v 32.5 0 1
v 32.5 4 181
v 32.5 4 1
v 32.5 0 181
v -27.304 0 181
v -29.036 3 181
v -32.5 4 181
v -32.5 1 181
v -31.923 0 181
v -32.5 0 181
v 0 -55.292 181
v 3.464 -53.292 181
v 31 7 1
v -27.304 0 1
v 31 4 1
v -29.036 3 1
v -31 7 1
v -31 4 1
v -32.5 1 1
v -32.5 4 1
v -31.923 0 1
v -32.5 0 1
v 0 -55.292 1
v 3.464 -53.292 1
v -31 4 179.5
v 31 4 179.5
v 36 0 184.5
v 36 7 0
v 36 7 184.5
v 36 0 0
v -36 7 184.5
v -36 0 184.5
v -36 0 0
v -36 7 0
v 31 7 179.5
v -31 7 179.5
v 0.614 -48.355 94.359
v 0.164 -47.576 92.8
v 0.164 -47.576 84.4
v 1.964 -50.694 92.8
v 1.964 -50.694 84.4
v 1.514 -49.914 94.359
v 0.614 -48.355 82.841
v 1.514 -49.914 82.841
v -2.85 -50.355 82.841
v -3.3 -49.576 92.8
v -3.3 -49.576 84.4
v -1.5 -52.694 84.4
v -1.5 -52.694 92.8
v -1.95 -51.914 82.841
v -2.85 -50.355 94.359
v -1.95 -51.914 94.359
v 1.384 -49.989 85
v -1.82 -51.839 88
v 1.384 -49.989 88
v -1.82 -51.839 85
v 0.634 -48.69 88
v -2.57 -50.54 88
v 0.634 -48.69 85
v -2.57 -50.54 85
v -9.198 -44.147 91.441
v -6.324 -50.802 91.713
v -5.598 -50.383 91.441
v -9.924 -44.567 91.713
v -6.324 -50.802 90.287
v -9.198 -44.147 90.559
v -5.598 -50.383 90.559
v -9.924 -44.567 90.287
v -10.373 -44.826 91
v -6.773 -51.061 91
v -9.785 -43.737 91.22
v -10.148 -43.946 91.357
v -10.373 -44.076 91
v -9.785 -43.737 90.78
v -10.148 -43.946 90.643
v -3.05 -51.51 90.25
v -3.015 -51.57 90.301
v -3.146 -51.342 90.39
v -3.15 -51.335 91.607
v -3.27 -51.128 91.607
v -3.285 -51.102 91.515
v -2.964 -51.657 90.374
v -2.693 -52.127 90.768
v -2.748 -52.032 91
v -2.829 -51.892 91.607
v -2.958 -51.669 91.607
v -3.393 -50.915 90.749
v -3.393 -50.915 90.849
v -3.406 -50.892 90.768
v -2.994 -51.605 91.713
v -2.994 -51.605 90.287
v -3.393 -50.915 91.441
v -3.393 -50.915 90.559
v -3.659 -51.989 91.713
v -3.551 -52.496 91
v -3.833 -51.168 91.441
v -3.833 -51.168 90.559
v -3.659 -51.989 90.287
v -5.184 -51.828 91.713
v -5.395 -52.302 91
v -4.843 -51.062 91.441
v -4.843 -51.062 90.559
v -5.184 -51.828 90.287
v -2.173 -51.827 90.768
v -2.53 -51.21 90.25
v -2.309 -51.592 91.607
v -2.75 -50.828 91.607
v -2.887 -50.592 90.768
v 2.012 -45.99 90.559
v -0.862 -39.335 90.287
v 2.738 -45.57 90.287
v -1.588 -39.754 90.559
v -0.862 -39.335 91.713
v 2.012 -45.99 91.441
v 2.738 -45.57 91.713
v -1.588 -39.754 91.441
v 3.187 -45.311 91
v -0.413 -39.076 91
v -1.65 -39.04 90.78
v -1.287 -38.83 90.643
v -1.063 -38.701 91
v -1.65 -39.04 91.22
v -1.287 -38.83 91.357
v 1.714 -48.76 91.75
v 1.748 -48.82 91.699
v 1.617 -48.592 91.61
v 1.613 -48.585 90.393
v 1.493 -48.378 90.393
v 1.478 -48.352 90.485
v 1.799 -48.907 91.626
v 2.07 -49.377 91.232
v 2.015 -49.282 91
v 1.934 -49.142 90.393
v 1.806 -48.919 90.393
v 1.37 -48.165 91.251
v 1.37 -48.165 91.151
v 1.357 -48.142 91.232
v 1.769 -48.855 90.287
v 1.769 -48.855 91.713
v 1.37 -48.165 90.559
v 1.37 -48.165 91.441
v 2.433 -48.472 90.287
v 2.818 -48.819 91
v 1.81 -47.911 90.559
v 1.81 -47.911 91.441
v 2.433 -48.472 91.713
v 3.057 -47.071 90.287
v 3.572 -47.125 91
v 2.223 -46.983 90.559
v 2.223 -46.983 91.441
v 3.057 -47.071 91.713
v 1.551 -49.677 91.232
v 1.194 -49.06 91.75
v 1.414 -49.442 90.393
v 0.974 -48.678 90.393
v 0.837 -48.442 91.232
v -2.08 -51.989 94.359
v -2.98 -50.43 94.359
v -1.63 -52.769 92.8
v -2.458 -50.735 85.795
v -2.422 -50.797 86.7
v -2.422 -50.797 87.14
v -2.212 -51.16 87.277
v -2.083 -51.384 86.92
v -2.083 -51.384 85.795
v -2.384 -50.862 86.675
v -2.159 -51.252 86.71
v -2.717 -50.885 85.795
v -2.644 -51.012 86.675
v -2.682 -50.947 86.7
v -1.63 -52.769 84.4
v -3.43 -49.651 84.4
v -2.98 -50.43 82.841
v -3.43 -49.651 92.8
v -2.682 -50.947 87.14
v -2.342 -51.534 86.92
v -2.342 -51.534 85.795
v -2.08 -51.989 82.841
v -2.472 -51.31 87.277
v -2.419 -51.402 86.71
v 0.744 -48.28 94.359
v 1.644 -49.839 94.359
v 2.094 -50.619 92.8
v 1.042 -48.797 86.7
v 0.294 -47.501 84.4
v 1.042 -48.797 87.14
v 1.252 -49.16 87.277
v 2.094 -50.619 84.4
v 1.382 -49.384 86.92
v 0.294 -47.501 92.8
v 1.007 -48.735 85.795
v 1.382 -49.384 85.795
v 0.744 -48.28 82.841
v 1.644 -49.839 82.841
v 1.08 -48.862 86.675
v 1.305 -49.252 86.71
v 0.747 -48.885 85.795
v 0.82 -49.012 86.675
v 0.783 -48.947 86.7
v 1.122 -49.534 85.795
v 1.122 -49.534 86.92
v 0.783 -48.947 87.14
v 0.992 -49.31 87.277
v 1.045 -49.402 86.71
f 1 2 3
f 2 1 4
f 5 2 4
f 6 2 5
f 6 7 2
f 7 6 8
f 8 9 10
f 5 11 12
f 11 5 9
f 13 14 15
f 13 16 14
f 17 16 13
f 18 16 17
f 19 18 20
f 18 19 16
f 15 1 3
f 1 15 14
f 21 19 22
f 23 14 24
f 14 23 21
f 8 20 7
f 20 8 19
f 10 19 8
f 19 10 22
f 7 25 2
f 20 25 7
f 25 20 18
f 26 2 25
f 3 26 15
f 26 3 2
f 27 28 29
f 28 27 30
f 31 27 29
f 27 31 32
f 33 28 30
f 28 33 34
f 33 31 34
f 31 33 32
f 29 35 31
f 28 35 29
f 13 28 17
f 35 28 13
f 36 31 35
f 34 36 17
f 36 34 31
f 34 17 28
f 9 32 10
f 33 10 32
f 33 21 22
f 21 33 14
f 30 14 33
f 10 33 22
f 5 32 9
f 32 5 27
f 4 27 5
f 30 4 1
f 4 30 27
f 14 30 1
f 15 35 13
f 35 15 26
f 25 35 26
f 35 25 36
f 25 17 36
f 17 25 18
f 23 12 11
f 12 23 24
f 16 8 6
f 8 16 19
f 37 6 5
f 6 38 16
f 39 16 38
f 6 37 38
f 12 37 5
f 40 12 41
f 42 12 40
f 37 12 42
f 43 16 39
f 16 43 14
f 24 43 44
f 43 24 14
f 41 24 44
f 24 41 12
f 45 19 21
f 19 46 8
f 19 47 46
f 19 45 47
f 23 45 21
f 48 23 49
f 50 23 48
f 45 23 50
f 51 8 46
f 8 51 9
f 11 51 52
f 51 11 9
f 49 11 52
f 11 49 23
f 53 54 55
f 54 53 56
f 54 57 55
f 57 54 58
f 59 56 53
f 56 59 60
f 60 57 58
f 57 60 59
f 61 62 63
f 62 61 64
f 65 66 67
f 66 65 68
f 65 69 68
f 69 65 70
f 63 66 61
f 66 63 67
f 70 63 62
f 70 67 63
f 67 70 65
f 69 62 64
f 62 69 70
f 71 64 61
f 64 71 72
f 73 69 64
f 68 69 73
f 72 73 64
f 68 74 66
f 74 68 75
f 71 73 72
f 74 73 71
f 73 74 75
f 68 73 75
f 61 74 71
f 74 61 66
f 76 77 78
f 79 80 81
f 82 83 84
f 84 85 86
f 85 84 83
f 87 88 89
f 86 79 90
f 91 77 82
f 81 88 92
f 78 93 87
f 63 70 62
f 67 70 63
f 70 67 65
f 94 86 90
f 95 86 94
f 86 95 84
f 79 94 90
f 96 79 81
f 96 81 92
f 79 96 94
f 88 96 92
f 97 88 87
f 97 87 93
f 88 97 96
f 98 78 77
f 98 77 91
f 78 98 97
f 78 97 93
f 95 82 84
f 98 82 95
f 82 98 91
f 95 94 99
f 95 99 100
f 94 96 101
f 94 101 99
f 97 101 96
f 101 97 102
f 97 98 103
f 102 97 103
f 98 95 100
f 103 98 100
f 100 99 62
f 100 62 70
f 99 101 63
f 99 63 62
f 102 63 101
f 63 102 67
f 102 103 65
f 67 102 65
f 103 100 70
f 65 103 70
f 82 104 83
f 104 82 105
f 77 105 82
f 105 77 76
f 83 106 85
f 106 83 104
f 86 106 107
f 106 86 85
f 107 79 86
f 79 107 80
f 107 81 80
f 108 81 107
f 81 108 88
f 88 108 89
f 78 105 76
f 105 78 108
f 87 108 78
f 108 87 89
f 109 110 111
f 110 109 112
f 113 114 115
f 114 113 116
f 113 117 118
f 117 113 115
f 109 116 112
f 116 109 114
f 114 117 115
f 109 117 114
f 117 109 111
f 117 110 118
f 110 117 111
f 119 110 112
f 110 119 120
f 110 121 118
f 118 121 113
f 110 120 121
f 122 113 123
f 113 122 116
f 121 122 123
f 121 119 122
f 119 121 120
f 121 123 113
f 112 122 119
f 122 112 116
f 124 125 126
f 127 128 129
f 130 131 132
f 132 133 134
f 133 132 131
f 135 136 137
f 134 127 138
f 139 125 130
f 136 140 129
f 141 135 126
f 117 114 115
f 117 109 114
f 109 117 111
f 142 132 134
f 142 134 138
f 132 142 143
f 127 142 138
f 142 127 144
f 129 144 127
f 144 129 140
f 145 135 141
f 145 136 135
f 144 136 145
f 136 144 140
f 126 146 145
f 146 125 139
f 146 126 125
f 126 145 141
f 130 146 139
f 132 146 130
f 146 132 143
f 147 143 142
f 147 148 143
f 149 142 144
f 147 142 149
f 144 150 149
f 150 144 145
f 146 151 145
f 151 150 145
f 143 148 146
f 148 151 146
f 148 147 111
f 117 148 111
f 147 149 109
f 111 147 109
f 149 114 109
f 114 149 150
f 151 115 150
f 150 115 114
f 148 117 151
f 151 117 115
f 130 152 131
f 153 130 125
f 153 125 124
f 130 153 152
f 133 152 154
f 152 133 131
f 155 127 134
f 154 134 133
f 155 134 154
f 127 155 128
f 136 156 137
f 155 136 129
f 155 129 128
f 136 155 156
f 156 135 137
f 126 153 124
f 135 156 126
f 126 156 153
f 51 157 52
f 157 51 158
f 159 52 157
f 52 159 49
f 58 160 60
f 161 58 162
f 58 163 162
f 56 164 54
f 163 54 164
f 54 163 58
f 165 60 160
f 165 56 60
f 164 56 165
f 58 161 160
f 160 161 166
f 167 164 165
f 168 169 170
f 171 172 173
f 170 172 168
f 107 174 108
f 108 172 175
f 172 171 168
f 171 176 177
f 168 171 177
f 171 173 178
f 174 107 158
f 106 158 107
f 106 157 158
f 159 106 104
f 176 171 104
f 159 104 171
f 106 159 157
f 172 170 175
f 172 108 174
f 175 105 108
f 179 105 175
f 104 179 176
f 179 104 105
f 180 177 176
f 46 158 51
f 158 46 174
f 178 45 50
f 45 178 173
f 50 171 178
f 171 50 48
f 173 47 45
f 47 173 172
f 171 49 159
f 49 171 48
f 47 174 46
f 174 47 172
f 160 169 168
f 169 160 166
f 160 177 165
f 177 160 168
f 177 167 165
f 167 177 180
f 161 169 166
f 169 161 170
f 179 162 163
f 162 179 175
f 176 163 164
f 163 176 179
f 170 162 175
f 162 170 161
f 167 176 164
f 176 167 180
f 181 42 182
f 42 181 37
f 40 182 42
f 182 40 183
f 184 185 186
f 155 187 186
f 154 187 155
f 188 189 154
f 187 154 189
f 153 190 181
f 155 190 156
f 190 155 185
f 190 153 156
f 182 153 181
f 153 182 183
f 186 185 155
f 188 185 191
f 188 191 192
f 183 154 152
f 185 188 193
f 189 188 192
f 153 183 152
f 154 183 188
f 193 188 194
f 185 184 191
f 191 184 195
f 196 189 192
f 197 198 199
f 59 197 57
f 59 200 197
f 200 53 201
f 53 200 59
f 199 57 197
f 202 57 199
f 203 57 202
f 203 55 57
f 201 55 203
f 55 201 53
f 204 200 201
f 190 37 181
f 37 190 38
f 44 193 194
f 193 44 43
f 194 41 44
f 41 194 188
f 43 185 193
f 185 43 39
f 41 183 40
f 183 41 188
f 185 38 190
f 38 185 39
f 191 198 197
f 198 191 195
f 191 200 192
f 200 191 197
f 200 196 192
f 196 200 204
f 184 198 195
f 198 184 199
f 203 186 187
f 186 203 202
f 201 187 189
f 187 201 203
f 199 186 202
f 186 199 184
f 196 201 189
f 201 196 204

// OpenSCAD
// file: ../../shared/doorhandle.scad
size=100;
door_thickness=40;


module doorhandle(s=size, dt=door_thickness){
    
    pl=s;//plate_length
    pw=0.3*s;//plate_width
    pt=s/40;//plate_thickness 
    kr=s/32; //keyhole_radius
    hr=s/16; //handle_radius
    hl=0.6*s; //handle_length
    
    module keyhole_punch() {
        translate([0,0,-pt/2])
        union() {
            linear_extrude(2*pt)
                polygon([[-kr,-kr*3],[kr,-kr*3],[0.5*kr,0],[-0.5*kr,0]]);
            cylinder(2*pt,kr,kr);
        }
    }
    module plate() {
        translate([-pw/2,-0.7*pl,-pt/2])
        difference() {
            union(){
                translate([pw/2,pl-pw/2,0])
                    cylinder(pt,pw/2,pw/2);
                translate([pw/2,pw/2,0])
                    cylinder(pt,pw/2,pw/2);
                translate([0,pw/2,0])
                    cube([pw,pl-pw,pt]);
            }
        translate([pw/2,pw*1.2,0])
            keyhole_punch();
        }
    }
    
   module handle() {
       union() {
           rotate([0,90,0])
           cylinder(hr+dt/2,hr,hr);
               translate([hr+dt/2,-3*hr,0])
           union() {
               translate([3*hr,-hl,0])
                   rotate([270,0,0])
                   union() {
                       cylinder(hl,hr,hr);
                       sphere(hr);
                   }
               intersection() {
                   translate([0,0,-3*hr])
                       cube([6*hr,6*hr,6*hr]);
                   rotate_extrude()
                       translate([3*hr, 0]) circle(hr);
               }
           }
       }
   }
   union() {
       handle();
           rotate([0,180,0])
                handle();
           rotate([90,0,90])
           union(){ 
                translate([0,0,dt/2])    
                plate();
                translate([0,0,-dt/2])     
                plate();
           }
   }

   
}


doorhandle();
// main file
door_width=65;
door_height=180;
door_thickness=4;
doorpost_width=5;
doorpost_inner_width=62;
doorpost_depth=7;
doorpost_protrude=1;
treshold_height=1;
door_open_angle=60;
doorhandle_size=12;

$vpt=([0,0,door_height/2]);

use <../../shared/doorhandle.scad>

module door(dw=door_width,
    dh=door_height,
    dt=door_thickness,
    dpw=doorpost_width,
    dpiw=doorpost_inner_width,
    dpd=doorpost_depth,
    dpp=doorpost_protrude,
    th=treshold_height,
    doa=door_open_angle,
    dhs=doorhandle_size) {
    
        
    module panel(extra,rotation) {
        translate([-dw/2,-extra,th]) 
            rotate([0,0,rotation])
                union() {
                difference() {
                    cube([dw,dt+extra,dh]);
                    translate([dw-0.45*dhs,-dhs/2,dh/2-0.5*dhs] )
                        cube([0.125*dhs,dhs,0.25*dhs]);
                }    
                translate([dw-(0.4*dhs),(dt+extra)/2,dh/2])
                    rotate([0,0,270])  
                    doorhandle(dhs,dt);
        }
    }  
    module punch()
    {
        translate([-dpiw/2,-dw/2,th])
            cube([dpiw,dpiw,dh-(dw-dpiw)/2]);
    }
    union(){
    difference(){
              translate([(dpiw+2*dpw)/-2,0,0])
                  cube([dpiw+2*dpw,dpd,dh+dpw+th-(dw-dpiw)/2]); 
              panel(dpp);
              punch(); 
         }
         
         translate([0,dpp,0])
            panel(0,0-doa);
    }
    
}

door();
